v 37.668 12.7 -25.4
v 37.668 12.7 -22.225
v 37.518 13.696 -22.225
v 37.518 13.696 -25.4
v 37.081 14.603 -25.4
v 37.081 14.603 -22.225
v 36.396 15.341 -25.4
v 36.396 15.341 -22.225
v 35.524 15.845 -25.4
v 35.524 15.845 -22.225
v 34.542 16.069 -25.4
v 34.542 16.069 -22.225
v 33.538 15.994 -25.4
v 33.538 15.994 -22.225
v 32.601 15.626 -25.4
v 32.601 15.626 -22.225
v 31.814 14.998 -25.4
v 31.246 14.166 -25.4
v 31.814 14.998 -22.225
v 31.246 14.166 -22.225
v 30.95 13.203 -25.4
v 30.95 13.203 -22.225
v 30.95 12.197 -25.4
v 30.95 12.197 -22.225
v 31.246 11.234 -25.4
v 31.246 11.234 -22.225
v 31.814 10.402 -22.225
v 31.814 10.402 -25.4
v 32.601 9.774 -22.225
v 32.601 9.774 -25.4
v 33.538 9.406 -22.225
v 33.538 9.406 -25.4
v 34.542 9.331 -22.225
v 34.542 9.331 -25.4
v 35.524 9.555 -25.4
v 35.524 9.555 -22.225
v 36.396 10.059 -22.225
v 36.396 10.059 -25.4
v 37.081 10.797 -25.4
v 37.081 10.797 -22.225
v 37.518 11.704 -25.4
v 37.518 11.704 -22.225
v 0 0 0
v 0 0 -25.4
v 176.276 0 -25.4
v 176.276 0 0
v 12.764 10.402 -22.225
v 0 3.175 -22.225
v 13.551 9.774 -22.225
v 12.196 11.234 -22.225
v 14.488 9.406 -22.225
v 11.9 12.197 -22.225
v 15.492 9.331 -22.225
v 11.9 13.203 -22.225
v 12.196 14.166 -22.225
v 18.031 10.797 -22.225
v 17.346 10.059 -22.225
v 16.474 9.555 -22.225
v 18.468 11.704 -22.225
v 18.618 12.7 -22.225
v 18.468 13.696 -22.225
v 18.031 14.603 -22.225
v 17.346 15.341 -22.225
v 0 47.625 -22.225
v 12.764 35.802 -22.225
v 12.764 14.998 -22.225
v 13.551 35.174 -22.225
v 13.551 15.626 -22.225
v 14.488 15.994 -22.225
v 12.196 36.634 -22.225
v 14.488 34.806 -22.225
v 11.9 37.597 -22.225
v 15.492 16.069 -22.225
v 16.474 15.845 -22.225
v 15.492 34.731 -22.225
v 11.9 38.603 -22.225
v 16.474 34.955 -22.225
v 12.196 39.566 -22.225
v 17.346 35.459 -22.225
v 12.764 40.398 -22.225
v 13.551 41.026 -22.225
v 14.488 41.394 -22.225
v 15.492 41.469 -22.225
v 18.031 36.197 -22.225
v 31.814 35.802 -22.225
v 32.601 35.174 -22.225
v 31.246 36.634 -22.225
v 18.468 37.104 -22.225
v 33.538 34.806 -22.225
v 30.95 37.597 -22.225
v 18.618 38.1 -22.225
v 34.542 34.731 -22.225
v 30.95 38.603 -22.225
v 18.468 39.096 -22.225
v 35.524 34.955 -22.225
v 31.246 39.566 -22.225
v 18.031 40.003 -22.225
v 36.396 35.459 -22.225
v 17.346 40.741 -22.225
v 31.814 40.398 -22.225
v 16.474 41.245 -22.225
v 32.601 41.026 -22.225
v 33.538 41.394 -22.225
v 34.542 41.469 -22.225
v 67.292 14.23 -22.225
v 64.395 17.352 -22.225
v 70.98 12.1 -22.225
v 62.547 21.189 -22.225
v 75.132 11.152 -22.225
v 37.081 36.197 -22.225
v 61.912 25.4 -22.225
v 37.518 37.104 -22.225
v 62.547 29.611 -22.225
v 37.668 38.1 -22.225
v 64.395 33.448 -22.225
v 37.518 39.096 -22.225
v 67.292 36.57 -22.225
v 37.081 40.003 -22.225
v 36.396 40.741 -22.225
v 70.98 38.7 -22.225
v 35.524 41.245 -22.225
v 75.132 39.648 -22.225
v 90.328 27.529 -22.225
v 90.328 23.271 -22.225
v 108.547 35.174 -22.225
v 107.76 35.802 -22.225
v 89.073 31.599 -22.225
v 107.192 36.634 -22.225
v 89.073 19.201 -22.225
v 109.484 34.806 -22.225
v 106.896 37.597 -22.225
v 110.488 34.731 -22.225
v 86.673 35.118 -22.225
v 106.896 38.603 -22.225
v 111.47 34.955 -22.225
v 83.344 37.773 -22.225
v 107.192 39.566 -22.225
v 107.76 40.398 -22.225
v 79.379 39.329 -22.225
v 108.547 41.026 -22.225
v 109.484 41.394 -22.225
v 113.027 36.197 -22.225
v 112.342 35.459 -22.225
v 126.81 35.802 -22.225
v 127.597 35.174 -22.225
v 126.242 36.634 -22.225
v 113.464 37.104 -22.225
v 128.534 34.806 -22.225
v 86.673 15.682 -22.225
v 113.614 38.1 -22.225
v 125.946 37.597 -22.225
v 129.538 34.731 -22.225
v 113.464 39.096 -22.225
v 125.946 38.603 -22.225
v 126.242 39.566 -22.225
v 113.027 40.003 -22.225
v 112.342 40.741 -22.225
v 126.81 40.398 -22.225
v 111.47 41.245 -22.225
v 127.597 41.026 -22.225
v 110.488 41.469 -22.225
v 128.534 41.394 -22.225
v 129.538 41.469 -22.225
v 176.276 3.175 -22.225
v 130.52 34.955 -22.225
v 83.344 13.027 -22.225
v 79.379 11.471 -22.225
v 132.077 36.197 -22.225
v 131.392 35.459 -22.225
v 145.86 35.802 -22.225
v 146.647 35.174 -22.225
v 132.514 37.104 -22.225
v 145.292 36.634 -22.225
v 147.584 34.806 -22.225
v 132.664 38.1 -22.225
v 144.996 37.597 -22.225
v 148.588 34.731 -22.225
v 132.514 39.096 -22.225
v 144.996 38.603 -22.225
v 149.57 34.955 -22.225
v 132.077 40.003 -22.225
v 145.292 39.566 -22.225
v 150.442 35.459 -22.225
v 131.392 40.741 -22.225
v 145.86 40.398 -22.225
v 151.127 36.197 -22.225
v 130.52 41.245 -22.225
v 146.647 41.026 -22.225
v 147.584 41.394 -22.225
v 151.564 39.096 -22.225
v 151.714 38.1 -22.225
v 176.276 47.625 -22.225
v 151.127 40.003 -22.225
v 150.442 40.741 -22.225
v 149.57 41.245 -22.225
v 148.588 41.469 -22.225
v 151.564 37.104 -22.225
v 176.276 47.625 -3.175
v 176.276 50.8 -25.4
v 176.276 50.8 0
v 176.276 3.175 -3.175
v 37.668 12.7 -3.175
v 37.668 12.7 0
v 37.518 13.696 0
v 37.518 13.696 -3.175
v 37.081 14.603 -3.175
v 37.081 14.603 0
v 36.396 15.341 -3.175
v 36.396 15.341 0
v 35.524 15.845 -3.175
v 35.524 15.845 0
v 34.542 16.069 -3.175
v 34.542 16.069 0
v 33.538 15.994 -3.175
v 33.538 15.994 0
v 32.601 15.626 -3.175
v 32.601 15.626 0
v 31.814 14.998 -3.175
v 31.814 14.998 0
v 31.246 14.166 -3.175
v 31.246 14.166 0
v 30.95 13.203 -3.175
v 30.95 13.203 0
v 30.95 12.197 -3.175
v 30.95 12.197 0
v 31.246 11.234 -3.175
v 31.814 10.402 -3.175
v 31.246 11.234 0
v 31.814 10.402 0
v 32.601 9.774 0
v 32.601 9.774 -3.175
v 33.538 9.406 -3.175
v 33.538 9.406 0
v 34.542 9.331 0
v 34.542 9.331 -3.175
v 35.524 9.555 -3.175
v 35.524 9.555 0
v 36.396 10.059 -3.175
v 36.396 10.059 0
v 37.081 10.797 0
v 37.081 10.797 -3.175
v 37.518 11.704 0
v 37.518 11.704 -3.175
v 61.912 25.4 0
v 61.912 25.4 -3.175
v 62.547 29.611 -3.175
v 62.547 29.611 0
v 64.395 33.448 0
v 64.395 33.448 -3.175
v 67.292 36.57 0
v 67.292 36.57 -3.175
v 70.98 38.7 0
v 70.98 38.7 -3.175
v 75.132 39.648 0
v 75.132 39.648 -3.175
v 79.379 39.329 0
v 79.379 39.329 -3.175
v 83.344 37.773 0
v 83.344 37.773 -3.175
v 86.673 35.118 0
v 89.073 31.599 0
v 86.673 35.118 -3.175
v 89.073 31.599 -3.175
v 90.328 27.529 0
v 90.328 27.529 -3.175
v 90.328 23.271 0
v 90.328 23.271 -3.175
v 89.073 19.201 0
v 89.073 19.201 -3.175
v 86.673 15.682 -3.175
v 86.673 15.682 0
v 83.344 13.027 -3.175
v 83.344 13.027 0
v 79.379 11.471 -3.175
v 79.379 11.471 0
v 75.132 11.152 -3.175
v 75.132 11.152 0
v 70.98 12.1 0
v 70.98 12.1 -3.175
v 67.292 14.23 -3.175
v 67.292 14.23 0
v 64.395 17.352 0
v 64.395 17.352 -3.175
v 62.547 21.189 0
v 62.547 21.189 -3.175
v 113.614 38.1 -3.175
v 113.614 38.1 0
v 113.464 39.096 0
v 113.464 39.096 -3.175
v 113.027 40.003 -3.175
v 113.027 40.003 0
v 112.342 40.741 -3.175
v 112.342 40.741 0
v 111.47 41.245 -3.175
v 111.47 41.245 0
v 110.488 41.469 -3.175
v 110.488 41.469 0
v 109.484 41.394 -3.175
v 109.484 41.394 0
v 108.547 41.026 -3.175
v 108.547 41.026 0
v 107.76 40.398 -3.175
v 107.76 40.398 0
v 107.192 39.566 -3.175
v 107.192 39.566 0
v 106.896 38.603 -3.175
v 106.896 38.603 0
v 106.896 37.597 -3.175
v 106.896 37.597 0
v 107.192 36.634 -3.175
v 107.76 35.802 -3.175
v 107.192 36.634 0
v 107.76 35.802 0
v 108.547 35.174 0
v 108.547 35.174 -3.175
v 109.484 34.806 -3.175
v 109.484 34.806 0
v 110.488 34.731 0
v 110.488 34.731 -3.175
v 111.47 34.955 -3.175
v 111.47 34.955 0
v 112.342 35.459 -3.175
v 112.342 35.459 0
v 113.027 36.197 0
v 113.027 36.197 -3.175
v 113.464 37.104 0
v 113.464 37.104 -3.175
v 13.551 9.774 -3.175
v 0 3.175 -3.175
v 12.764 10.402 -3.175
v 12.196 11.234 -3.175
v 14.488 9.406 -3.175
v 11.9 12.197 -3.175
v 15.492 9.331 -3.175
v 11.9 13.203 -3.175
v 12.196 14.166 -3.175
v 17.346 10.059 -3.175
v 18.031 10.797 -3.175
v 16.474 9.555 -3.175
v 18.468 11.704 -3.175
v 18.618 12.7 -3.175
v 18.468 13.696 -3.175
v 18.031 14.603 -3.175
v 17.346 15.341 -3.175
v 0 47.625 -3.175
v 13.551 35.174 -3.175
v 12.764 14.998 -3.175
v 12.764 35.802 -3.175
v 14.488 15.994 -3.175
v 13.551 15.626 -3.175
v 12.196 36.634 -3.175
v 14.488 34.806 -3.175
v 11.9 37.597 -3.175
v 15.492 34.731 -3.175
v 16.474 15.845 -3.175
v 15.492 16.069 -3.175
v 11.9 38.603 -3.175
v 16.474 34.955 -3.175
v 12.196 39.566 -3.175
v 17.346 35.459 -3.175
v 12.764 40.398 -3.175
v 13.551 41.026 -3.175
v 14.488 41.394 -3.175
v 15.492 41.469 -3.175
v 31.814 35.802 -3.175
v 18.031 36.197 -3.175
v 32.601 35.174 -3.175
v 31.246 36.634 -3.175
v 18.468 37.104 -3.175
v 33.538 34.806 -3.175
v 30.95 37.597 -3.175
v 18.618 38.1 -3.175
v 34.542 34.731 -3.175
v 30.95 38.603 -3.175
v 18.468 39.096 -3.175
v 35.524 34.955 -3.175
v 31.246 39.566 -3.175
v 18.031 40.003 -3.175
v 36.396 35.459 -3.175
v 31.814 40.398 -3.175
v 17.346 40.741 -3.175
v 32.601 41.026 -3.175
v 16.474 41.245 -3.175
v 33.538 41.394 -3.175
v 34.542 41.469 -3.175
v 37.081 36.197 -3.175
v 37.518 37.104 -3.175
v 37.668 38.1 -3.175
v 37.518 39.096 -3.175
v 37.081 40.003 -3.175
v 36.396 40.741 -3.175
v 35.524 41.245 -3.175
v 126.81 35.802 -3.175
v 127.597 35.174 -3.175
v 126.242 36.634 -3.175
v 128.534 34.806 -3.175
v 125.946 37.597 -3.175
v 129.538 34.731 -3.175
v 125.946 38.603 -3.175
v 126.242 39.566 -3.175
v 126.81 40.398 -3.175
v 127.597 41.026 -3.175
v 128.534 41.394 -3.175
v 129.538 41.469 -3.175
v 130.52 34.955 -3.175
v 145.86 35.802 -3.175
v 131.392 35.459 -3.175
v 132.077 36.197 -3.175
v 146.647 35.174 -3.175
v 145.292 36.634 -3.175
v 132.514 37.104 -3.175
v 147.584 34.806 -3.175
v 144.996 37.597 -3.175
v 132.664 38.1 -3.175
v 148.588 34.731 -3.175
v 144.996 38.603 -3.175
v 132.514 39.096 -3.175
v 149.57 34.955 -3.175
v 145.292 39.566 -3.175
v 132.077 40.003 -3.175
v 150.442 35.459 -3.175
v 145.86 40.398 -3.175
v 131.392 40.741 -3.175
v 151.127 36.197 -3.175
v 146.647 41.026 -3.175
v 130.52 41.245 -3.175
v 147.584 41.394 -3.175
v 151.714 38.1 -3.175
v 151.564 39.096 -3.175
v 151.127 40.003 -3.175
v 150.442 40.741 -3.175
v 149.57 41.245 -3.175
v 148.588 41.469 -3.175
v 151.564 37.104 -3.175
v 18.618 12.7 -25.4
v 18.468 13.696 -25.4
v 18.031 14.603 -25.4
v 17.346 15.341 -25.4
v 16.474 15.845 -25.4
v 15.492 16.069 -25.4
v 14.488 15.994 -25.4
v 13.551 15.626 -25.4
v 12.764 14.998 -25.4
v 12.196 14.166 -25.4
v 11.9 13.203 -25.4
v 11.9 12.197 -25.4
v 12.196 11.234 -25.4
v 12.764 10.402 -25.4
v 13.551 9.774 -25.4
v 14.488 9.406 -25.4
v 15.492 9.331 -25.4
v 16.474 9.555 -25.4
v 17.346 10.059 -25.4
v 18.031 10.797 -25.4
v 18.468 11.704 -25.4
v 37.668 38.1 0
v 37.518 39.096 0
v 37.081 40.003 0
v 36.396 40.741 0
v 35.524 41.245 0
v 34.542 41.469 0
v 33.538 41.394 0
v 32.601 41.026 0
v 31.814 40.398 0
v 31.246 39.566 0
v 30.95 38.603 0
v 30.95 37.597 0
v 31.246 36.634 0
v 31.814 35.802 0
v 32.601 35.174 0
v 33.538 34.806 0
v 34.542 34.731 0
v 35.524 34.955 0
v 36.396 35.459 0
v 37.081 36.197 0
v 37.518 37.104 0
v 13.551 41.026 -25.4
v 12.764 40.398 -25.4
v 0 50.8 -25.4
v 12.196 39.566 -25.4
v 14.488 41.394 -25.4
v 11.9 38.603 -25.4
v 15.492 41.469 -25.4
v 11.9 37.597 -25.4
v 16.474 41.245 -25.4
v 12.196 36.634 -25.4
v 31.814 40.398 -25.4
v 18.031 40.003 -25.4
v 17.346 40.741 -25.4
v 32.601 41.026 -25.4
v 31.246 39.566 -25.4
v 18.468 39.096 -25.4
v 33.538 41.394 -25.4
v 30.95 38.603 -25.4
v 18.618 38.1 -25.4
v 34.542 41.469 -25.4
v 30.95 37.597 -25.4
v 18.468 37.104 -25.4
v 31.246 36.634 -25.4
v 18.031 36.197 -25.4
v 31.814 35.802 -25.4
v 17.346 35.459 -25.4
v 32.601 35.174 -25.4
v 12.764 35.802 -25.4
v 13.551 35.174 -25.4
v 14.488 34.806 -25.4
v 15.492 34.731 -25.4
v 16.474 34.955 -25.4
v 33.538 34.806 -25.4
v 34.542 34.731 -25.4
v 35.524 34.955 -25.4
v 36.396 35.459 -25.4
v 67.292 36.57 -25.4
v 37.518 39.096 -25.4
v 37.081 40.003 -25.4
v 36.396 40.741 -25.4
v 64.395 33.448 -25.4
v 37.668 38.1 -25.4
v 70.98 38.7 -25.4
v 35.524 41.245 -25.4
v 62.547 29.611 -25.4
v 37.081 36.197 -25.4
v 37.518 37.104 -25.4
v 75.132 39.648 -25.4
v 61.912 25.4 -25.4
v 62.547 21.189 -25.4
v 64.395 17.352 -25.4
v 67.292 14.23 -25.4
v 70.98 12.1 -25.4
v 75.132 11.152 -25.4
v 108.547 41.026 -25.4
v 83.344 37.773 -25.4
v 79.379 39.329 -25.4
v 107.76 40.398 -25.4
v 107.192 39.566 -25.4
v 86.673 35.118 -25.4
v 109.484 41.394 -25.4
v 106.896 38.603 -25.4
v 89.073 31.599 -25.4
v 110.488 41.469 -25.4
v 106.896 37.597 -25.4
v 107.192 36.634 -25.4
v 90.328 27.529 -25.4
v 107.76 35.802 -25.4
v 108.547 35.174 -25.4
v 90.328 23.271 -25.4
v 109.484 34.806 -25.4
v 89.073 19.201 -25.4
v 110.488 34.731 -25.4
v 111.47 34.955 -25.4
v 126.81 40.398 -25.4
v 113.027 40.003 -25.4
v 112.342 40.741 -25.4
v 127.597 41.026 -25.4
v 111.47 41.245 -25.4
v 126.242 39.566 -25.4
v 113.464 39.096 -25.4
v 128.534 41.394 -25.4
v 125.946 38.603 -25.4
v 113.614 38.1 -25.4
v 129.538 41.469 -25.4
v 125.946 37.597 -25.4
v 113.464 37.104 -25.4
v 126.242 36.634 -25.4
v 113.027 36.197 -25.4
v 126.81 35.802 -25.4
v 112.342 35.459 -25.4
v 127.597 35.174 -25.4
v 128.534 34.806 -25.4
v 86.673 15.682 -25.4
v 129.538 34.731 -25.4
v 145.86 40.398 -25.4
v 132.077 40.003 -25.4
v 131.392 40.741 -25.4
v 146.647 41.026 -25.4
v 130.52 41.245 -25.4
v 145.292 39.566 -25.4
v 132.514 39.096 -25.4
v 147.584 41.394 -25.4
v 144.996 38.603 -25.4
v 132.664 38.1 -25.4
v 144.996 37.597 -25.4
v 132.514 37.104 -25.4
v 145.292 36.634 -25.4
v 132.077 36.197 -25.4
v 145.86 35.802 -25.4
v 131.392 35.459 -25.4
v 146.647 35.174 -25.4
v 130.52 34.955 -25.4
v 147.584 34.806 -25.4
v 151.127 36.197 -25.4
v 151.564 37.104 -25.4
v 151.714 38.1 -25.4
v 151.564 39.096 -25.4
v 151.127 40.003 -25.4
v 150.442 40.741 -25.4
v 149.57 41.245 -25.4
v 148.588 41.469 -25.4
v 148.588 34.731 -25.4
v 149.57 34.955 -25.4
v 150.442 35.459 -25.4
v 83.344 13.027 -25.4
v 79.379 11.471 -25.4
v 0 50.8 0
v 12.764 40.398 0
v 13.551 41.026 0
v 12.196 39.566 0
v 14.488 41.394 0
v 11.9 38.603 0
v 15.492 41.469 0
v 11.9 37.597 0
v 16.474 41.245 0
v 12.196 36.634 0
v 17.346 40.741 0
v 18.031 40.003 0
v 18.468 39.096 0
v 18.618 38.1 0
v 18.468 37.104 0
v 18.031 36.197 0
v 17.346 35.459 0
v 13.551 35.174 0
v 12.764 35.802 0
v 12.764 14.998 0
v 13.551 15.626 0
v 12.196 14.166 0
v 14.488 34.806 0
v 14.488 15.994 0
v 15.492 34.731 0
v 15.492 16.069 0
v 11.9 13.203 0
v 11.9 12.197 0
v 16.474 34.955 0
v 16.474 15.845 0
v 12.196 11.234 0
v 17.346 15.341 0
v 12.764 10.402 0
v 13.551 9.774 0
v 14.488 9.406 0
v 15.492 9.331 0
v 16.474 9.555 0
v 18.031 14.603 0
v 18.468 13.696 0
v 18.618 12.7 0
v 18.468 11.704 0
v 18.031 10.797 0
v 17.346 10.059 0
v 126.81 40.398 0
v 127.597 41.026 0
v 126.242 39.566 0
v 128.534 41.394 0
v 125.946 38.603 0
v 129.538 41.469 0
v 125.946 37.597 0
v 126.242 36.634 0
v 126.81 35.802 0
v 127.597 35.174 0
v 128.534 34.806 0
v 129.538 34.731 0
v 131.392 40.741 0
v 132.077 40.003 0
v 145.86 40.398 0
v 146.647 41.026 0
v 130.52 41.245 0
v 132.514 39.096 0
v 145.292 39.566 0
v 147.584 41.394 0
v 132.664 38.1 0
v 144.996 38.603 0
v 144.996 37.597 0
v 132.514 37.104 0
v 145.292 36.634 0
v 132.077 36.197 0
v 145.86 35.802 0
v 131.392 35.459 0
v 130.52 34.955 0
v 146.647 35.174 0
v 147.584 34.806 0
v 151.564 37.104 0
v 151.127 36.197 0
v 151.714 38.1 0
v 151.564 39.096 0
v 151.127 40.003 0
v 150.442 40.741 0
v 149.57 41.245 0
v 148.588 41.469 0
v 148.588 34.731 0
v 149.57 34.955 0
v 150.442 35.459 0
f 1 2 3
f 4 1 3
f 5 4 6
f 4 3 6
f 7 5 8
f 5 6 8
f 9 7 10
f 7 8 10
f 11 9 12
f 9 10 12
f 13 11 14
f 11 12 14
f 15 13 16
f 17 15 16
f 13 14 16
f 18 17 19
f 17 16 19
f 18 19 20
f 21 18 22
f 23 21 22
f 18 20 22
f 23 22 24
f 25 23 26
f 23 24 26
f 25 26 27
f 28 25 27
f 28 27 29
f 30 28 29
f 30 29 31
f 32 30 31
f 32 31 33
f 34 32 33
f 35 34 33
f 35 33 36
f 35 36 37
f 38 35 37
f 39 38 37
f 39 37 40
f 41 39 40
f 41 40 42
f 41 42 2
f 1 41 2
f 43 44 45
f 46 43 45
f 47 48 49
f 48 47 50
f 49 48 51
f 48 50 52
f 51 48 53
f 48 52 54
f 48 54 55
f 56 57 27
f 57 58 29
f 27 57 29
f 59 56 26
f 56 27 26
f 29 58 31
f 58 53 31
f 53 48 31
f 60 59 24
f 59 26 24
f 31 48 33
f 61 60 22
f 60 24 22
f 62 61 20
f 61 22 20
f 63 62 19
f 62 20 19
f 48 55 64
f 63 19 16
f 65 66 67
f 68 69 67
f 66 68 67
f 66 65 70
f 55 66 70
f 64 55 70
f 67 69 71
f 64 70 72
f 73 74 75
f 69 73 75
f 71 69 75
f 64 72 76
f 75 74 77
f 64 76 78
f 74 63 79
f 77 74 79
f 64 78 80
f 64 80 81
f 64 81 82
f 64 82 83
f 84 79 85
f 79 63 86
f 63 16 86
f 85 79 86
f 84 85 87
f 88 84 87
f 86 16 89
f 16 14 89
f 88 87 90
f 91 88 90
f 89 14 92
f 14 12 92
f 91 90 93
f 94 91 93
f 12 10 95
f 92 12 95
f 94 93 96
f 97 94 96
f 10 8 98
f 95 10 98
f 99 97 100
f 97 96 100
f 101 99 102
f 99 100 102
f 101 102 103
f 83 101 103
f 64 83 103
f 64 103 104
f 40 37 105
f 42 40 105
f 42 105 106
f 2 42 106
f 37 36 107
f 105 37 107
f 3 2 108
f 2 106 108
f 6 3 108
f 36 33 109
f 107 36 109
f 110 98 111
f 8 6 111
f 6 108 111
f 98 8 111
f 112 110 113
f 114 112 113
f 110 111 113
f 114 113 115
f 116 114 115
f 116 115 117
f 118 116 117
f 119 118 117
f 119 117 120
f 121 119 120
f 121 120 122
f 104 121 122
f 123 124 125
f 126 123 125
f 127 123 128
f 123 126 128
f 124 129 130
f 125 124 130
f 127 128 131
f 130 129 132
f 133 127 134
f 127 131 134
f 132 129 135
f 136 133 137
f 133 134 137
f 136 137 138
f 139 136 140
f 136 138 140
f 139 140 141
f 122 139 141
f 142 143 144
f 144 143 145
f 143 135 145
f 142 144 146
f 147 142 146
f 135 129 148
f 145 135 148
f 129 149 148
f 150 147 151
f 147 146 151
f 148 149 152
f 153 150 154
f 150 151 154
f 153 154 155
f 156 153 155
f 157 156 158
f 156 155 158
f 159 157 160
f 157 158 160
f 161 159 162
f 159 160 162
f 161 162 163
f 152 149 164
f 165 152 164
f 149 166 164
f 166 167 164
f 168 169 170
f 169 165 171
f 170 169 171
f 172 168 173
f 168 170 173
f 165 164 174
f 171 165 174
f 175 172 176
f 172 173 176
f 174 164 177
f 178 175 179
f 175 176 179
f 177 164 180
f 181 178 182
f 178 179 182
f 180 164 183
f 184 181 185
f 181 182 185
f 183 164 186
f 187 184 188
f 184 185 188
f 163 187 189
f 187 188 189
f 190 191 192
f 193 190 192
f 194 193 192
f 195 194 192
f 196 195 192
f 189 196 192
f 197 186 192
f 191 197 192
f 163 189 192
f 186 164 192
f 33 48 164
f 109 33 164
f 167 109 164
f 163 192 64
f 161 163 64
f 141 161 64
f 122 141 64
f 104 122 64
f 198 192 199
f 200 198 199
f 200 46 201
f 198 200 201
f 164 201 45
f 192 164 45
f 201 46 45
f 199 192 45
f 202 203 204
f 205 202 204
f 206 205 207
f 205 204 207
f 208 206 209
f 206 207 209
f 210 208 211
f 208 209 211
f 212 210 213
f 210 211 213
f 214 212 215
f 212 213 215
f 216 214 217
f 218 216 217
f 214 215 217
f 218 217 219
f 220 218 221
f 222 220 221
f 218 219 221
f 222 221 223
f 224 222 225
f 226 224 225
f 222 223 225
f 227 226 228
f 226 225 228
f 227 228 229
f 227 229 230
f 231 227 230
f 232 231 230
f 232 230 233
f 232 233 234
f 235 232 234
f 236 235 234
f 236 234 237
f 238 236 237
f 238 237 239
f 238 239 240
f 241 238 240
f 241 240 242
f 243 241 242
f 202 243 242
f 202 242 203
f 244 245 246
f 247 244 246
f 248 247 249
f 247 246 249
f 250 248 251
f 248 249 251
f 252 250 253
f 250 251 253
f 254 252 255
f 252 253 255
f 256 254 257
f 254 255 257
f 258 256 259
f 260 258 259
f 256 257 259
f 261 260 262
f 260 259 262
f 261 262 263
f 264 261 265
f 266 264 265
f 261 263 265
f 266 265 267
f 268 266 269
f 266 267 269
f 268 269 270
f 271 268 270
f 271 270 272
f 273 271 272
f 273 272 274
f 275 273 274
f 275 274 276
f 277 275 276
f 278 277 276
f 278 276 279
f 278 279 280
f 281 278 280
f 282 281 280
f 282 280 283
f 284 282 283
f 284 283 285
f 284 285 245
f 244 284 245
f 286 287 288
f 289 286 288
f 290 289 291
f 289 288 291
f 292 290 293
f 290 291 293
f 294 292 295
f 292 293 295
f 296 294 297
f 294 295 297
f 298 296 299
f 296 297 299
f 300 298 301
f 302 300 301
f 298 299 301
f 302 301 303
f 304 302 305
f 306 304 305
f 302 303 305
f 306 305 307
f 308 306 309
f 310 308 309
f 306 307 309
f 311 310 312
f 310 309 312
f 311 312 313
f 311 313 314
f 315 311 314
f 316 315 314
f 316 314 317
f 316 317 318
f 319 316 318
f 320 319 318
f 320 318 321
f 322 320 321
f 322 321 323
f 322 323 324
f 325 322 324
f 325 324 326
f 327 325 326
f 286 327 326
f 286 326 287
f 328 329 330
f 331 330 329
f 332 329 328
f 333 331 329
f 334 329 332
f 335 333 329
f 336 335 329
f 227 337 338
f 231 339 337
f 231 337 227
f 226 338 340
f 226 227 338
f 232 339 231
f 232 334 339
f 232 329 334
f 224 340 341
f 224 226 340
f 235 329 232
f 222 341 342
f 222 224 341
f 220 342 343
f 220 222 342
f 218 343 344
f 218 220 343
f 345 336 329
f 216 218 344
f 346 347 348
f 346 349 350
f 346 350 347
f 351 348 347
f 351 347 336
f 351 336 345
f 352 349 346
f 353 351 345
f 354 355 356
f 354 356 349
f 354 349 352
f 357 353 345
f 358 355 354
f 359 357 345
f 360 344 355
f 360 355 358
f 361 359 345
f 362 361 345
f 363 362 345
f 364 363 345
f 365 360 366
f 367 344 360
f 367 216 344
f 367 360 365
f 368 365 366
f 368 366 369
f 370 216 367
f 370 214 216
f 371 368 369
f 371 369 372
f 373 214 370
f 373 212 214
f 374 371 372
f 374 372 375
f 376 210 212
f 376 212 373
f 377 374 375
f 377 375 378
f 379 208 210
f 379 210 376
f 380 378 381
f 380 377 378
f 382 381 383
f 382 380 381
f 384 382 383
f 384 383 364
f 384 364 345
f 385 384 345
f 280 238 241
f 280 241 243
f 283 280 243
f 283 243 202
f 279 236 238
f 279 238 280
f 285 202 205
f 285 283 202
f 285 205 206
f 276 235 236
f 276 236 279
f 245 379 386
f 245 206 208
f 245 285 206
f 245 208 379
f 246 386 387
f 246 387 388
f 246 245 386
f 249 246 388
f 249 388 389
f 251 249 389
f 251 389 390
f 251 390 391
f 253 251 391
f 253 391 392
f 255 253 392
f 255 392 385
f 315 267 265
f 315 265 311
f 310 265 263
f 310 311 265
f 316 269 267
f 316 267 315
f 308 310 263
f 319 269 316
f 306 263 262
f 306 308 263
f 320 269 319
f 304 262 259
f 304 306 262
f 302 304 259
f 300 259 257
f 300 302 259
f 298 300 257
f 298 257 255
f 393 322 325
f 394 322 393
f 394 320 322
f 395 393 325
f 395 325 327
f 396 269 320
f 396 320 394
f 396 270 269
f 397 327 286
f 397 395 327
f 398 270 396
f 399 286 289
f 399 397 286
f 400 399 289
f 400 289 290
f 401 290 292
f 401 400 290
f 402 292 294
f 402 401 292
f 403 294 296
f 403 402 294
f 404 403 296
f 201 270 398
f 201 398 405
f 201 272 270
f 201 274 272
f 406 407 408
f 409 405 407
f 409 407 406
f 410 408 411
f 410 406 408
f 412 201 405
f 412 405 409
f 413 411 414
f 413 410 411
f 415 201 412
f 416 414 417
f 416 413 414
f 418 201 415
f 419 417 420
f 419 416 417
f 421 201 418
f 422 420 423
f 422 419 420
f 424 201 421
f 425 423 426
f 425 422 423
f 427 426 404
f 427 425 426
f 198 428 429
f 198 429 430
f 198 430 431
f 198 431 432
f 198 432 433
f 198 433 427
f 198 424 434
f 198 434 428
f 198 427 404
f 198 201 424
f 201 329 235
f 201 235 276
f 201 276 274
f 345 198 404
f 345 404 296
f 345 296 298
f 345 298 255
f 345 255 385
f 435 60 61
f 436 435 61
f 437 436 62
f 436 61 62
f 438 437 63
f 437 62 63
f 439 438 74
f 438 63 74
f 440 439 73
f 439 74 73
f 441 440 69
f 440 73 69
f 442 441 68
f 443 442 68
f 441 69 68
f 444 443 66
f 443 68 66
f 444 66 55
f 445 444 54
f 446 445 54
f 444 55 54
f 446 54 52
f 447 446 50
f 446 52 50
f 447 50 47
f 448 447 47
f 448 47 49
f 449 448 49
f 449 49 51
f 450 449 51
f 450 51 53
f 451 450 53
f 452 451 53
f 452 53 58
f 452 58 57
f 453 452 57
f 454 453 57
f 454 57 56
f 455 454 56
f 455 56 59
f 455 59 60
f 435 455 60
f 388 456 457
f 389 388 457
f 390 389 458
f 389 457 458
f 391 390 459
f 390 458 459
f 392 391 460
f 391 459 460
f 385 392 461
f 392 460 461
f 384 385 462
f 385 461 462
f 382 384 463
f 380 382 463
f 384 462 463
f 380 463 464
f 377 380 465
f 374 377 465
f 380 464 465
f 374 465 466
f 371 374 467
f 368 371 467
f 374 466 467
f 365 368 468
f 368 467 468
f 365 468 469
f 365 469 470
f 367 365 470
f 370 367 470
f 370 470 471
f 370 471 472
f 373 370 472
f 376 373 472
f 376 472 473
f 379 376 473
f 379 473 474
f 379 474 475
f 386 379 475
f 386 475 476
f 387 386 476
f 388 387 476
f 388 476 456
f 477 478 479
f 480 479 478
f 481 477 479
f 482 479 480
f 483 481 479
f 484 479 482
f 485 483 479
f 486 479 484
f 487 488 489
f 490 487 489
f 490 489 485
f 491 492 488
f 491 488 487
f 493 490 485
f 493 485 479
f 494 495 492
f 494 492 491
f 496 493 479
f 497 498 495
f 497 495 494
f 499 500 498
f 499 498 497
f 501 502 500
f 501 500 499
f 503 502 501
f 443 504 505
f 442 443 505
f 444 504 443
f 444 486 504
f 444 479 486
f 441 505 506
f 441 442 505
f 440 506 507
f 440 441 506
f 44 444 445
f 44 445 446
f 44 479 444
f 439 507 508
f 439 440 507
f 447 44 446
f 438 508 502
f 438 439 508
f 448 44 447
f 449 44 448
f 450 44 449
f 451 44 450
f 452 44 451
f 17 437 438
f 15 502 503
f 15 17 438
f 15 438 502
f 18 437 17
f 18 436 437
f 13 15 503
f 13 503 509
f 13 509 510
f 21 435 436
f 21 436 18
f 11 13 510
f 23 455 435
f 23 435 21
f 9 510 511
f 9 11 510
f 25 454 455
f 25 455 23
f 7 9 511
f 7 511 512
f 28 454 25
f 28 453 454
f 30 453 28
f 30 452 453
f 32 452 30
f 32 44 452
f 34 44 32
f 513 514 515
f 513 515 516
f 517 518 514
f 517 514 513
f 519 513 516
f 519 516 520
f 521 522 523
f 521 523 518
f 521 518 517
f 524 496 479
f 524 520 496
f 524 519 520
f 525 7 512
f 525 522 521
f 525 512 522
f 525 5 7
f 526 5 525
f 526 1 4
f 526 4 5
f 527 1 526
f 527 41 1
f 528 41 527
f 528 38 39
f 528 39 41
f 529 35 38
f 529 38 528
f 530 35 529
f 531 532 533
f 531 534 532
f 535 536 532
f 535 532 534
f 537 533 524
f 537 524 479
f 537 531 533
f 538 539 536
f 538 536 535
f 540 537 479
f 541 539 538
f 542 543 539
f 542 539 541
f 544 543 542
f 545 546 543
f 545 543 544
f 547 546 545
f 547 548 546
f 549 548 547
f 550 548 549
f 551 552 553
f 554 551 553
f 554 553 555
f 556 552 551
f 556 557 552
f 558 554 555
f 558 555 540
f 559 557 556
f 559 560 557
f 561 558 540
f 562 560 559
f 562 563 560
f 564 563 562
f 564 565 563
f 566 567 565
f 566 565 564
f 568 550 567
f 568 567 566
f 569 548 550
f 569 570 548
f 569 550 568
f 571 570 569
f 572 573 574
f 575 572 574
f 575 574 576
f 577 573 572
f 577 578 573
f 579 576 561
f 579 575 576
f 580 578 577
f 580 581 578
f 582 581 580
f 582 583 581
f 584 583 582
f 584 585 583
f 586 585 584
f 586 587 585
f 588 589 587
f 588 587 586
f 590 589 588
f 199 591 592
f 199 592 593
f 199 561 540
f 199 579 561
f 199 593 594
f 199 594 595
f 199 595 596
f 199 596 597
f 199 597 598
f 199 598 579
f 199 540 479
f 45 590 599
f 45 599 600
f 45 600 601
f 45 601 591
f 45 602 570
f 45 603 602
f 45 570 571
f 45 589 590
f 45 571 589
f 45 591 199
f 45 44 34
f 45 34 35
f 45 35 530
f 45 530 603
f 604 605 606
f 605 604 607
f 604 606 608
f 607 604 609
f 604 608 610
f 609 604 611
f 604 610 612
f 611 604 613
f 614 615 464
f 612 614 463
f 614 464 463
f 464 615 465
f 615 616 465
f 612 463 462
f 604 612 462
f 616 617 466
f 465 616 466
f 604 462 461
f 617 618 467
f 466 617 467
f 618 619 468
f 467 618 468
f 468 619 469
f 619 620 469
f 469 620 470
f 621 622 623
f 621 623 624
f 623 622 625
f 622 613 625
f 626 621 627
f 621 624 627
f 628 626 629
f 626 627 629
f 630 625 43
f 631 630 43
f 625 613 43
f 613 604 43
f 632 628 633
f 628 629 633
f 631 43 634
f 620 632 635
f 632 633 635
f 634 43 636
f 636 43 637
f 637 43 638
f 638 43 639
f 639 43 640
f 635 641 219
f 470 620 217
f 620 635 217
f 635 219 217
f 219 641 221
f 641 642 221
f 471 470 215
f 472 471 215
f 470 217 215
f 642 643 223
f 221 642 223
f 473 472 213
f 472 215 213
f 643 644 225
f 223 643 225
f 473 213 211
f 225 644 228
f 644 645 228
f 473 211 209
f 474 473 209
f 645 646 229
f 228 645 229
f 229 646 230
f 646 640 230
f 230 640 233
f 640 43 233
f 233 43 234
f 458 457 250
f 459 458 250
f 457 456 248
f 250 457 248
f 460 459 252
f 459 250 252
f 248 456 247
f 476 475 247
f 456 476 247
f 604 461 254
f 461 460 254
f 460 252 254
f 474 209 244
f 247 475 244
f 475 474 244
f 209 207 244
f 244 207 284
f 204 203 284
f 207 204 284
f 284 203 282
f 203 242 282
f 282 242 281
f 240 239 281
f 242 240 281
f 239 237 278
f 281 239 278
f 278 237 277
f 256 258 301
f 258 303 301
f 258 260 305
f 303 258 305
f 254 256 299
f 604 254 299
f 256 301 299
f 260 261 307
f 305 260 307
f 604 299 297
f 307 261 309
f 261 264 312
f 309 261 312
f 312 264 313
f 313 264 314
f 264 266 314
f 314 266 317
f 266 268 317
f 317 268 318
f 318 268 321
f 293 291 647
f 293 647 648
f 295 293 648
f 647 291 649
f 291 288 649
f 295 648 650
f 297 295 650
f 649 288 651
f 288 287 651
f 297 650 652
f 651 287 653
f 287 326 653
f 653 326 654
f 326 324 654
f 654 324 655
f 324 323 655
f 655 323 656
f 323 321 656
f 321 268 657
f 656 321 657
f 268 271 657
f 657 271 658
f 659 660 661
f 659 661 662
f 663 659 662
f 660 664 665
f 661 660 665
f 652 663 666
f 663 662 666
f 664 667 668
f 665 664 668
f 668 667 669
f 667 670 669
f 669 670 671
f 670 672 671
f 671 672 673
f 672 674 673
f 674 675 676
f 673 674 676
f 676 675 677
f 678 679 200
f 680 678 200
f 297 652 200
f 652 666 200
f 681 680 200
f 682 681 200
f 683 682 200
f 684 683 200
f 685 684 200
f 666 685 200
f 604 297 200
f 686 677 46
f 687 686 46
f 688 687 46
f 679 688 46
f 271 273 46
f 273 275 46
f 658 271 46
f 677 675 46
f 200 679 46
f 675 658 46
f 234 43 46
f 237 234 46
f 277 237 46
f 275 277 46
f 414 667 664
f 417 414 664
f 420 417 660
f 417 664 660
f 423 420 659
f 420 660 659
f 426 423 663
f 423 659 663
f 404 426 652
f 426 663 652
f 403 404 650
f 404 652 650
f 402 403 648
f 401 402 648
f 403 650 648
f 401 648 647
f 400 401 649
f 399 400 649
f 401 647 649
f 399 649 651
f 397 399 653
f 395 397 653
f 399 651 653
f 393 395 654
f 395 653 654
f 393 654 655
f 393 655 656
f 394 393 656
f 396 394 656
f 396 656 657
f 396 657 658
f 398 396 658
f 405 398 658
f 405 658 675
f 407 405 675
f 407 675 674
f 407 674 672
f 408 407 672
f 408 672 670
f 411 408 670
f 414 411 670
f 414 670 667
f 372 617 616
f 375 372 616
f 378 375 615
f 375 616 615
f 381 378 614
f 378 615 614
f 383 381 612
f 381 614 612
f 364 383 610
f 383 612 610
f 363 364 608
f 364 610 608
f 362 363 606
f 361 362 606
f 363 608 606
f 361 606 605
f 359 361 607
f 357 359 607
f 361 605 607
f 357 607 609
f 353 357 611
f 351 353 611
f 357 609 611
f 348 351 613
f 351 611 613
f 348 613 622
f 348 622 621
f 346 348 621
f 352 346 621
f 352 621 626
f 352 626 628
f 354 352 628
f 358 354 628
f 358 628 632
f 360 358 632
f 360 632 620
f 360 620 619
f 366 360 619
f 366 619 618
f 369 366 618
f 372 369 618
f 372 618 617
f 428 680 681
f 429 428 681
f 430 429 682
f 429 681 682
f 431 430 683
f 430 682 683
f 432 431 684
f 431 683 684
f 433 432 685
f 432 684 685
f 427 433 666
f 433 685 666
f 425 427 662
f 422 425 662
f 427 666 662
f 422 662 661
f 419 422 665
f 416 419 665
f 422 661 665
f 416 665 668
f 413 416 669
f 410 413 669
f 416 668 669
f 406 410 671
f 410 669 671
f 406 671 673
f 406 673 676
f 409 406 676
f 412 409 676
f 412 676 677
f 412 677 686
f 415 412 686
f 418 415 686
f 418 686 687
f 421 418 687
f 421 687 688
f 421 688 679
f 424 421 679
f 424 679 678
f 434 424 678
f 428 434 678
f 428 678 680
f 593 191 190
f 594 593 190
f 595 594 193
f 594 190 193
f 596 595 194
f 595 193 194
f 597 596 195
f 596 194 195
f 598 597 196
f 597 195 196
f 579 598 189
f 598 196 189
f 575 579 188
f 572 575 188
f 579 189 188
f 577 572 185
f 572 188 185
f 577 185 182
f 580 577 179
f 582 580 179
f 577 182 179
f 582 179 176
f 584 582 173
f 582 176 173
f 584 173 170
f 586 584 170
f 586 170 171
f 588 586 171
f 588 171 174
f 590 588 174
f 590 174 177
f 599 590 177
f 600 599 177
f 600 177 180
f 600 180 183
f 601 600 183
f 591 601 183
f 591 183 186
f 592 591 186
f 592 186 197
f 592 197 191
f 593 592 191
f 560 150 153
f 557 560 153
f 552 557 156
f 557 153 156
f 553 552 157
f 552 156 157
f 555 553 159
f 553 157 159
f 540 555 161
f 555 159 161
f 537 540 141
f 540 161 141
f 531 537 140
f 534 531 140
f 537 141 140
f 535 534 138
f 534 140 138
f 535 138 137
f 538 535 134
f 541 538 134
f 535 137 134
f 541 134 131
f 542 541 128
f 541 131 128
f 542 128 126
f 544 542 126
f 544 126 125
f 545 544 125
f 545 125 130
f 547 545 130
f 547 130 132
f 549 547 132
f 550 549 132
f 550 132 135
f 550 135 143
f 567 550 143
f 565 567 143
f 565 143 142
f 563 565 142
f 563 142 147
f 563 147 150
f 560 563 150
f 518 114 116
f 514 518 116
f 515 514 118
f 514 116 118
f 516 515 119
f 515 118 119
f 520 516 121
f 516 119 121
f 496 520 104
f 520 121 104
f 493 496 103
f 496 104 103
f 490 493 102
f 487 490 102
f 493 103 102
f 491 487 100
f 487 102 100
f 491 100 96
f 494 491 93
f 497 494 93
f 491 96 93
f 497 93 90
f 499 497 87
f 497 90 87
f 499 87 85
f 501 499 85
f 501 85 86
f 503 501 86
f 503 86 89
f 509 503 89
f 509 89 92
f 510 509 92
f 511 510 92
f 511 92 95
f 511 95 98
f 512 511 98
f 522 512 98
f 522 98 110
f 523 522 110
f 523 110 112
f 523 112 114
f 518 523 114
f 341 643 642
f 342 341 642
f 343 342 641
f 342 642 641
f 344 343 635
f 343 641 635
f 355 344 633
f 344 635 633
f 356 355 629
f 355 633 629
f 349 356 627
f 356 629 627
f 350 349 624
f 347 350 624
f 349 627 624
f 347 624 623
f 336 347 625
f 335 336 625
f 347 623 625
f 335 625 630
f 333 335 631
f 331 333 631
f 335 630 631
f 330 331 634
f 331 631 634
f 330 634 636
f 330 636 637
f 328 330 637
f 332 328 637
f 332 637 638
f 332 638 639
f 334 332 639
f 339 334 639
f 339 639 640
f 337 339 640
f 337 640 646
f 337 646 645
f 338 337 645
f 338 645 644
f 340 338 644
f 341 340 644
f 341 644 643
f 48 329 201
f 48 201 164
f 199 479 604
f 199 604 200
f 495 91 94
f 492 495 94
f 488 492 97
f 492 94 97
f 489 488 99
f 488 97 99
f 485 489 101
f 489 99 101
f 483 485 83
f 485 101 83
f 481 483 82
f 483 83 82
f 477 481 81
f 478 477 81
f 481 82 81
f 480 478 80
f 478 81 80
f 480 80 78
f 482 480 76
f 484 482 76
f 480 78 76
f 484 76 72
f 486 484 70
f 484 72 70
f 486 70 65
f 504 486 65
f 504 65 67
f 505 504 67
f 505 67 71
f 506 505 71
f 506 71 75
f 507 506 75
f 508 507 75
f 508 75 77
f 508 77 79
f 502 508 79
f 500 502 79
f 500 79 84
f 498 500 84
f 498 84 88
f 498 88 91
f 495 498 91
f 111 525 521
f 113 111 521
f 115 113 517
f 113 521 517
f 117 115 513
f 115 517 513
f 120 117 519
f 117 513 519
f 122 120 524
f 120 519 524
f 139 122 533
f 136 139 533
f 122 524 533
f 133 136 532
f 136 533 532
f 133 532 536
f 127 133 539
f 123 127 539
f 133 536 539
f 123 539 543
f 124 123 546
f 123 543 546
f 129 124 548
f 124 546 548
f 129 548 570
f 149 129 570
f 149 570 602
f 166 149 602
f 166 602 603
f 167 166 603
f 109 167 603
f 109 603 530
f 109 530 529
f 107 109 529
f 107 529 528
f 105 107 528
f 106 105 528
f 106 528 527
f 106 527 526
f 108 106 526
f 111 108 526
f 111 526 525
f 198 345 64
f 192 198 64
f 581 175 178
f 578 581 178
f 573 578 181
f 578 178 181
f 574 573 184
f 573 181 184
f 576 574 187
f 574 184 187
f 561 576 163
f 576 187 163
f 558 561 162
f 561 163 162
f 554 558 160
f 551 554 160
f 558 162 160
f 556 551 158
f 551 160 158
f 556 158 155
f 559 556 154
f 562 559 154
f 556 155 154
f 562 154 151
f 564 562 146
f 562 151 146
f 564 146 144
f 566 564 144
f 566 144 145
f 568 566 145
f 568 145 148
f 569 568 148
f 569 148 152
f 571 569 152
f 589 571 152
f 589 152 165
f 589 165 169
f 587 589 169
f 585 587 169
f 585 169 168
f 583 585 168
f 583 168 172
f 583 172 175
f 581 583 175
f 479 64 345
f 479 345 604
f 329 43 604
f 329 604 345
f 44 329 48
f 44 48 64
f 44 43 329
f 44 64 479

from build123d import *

# Parameters (mm, degrees)
SKETCH1_W           = 176.276
SKETCH1_H           = 25.4
BOSS_EXTRUDE1_DEPTH = 50.8
SKETCH2_OUTSIDE_W   = 64.44
SKETCH2_OUTSIDE_H   = 89.84
SKETCH2_OUTSIDE_W_2 = 25.4
SKETCH2_OUTSIDE_H_2 = 50.8
SKETCH2_OUTSIDE_W_3 = 19.05
SKETCH2_OUTSIDE_H_3 = 44.45
CUT_EXTRUDE1_DEPTH  = 186.199968078
SKETCH3_R           = 14.2875
CUT_EXTRUDE2_DEPTH  = 186.199968078
SKETCH4_R           = 3.3782
CUT_EXTRUDE3_DEPTH  = 186.199968078
SKETCH5_R           = 3.3782
CUT_EXTRUDE4_DEPTH  = 186.199968078


with BuildPart() as part:
    # Sketch1 → Boss-Extrude1 (new body)
    with BuildSketch(Plane(origin=(0, 0, 0), x_dir=(1, 0, 0), z_dir=(0, 1, 0))):
        with Locations((88.138, 12.7)):
            Rectangle(SKETCH1_W, SKETCH1_H)
    extrude(amount=BOSS_EXTRUDE1_DEPTH)

    # Sketch2 outside → Cut-Extrude1 (cut, through all)
    # profile 1 of 2: a face of its own
    with BuildSketch(Plane(origin=(176.276, 0, 0), x_dir=(0, 0, -1), z_dir=(1, 0, 0))):
        with Locations((12.7, 25.4)):
            Rectangle(SKETCH2_OUTSIDE_W, SKETCH2_OUTSIDE_H)
        with Locations((12.7, 25.4)):
            Rectangle(SKETCH2_OUTSIDE_W_2, SKETCH2_OUTSIDE_H_2, mode=Mode.SUBTRACT)
    # profile 2 of 2: a face of its own
    with BuildSketch(Plane(origin=(176.276, 0, 0), x_dir=(0, 0, -1), z_dir=(1, 0, 0))):
        with Locations((12.7, 25.4)):
            Rectangle(SKETCH2_OUTSIDE_W_3, SKETCH2_OUTSIDE_H_3)
    extrude(amount=-CUT_EXTRUDE1_DEPTH, mode=Mode.SUBTRACT)

    # Sketch3 → Cut-Extrude2 (cut, through all)
    with BuildSketch(Plane(origin=(0, 0, -25.4), x_dir=(-1, 0, 0), z_dir=(0, 0, -1))):
        with Locations((-76.2, 25.4)):
            Circle(SKETCH3_R)
    extrude(amount=-CUT_EXTRUDE2_DEPTH, mode=Mode.SUBTRACT)

    # Sketch4 → Cut-Extrude3 (cut, through all)
    with BuildSketch(Plane.XY):
        with Locations((148.336, 38.1)):
            Circle(SKETCH4_R)
        with Locations((129.286, 38.1)):
            Circle(SKETCH4_R)
        with Locations((110.236, 38.1)):
            Circle(SKETCH4_R)
    extrude(amount=-CUT_EXTRUDE3_DEPTH, mode=Mode.SUBTRACT)

    # Sketch5 → Cut-Extrude4 (cut, through all)
    with BuildSketch(Plane.XY):
        with Locations((15.24, 38.1)):
            Circle(SKETCH5_R)
        with Locations((15.24, 12.7)):
            Circle(SKETCH5_R)
        with Locations((34.29, 12.7)):
            Circle(SKETCH5_R)
        with Locations((34.29, 38.1)):
            Circle(SKETCH5_R)
    extrude(amount=-CUT_EXTRUDE4_DEPTH, mode=Mode.SUBTRACT)


solid = part.part
